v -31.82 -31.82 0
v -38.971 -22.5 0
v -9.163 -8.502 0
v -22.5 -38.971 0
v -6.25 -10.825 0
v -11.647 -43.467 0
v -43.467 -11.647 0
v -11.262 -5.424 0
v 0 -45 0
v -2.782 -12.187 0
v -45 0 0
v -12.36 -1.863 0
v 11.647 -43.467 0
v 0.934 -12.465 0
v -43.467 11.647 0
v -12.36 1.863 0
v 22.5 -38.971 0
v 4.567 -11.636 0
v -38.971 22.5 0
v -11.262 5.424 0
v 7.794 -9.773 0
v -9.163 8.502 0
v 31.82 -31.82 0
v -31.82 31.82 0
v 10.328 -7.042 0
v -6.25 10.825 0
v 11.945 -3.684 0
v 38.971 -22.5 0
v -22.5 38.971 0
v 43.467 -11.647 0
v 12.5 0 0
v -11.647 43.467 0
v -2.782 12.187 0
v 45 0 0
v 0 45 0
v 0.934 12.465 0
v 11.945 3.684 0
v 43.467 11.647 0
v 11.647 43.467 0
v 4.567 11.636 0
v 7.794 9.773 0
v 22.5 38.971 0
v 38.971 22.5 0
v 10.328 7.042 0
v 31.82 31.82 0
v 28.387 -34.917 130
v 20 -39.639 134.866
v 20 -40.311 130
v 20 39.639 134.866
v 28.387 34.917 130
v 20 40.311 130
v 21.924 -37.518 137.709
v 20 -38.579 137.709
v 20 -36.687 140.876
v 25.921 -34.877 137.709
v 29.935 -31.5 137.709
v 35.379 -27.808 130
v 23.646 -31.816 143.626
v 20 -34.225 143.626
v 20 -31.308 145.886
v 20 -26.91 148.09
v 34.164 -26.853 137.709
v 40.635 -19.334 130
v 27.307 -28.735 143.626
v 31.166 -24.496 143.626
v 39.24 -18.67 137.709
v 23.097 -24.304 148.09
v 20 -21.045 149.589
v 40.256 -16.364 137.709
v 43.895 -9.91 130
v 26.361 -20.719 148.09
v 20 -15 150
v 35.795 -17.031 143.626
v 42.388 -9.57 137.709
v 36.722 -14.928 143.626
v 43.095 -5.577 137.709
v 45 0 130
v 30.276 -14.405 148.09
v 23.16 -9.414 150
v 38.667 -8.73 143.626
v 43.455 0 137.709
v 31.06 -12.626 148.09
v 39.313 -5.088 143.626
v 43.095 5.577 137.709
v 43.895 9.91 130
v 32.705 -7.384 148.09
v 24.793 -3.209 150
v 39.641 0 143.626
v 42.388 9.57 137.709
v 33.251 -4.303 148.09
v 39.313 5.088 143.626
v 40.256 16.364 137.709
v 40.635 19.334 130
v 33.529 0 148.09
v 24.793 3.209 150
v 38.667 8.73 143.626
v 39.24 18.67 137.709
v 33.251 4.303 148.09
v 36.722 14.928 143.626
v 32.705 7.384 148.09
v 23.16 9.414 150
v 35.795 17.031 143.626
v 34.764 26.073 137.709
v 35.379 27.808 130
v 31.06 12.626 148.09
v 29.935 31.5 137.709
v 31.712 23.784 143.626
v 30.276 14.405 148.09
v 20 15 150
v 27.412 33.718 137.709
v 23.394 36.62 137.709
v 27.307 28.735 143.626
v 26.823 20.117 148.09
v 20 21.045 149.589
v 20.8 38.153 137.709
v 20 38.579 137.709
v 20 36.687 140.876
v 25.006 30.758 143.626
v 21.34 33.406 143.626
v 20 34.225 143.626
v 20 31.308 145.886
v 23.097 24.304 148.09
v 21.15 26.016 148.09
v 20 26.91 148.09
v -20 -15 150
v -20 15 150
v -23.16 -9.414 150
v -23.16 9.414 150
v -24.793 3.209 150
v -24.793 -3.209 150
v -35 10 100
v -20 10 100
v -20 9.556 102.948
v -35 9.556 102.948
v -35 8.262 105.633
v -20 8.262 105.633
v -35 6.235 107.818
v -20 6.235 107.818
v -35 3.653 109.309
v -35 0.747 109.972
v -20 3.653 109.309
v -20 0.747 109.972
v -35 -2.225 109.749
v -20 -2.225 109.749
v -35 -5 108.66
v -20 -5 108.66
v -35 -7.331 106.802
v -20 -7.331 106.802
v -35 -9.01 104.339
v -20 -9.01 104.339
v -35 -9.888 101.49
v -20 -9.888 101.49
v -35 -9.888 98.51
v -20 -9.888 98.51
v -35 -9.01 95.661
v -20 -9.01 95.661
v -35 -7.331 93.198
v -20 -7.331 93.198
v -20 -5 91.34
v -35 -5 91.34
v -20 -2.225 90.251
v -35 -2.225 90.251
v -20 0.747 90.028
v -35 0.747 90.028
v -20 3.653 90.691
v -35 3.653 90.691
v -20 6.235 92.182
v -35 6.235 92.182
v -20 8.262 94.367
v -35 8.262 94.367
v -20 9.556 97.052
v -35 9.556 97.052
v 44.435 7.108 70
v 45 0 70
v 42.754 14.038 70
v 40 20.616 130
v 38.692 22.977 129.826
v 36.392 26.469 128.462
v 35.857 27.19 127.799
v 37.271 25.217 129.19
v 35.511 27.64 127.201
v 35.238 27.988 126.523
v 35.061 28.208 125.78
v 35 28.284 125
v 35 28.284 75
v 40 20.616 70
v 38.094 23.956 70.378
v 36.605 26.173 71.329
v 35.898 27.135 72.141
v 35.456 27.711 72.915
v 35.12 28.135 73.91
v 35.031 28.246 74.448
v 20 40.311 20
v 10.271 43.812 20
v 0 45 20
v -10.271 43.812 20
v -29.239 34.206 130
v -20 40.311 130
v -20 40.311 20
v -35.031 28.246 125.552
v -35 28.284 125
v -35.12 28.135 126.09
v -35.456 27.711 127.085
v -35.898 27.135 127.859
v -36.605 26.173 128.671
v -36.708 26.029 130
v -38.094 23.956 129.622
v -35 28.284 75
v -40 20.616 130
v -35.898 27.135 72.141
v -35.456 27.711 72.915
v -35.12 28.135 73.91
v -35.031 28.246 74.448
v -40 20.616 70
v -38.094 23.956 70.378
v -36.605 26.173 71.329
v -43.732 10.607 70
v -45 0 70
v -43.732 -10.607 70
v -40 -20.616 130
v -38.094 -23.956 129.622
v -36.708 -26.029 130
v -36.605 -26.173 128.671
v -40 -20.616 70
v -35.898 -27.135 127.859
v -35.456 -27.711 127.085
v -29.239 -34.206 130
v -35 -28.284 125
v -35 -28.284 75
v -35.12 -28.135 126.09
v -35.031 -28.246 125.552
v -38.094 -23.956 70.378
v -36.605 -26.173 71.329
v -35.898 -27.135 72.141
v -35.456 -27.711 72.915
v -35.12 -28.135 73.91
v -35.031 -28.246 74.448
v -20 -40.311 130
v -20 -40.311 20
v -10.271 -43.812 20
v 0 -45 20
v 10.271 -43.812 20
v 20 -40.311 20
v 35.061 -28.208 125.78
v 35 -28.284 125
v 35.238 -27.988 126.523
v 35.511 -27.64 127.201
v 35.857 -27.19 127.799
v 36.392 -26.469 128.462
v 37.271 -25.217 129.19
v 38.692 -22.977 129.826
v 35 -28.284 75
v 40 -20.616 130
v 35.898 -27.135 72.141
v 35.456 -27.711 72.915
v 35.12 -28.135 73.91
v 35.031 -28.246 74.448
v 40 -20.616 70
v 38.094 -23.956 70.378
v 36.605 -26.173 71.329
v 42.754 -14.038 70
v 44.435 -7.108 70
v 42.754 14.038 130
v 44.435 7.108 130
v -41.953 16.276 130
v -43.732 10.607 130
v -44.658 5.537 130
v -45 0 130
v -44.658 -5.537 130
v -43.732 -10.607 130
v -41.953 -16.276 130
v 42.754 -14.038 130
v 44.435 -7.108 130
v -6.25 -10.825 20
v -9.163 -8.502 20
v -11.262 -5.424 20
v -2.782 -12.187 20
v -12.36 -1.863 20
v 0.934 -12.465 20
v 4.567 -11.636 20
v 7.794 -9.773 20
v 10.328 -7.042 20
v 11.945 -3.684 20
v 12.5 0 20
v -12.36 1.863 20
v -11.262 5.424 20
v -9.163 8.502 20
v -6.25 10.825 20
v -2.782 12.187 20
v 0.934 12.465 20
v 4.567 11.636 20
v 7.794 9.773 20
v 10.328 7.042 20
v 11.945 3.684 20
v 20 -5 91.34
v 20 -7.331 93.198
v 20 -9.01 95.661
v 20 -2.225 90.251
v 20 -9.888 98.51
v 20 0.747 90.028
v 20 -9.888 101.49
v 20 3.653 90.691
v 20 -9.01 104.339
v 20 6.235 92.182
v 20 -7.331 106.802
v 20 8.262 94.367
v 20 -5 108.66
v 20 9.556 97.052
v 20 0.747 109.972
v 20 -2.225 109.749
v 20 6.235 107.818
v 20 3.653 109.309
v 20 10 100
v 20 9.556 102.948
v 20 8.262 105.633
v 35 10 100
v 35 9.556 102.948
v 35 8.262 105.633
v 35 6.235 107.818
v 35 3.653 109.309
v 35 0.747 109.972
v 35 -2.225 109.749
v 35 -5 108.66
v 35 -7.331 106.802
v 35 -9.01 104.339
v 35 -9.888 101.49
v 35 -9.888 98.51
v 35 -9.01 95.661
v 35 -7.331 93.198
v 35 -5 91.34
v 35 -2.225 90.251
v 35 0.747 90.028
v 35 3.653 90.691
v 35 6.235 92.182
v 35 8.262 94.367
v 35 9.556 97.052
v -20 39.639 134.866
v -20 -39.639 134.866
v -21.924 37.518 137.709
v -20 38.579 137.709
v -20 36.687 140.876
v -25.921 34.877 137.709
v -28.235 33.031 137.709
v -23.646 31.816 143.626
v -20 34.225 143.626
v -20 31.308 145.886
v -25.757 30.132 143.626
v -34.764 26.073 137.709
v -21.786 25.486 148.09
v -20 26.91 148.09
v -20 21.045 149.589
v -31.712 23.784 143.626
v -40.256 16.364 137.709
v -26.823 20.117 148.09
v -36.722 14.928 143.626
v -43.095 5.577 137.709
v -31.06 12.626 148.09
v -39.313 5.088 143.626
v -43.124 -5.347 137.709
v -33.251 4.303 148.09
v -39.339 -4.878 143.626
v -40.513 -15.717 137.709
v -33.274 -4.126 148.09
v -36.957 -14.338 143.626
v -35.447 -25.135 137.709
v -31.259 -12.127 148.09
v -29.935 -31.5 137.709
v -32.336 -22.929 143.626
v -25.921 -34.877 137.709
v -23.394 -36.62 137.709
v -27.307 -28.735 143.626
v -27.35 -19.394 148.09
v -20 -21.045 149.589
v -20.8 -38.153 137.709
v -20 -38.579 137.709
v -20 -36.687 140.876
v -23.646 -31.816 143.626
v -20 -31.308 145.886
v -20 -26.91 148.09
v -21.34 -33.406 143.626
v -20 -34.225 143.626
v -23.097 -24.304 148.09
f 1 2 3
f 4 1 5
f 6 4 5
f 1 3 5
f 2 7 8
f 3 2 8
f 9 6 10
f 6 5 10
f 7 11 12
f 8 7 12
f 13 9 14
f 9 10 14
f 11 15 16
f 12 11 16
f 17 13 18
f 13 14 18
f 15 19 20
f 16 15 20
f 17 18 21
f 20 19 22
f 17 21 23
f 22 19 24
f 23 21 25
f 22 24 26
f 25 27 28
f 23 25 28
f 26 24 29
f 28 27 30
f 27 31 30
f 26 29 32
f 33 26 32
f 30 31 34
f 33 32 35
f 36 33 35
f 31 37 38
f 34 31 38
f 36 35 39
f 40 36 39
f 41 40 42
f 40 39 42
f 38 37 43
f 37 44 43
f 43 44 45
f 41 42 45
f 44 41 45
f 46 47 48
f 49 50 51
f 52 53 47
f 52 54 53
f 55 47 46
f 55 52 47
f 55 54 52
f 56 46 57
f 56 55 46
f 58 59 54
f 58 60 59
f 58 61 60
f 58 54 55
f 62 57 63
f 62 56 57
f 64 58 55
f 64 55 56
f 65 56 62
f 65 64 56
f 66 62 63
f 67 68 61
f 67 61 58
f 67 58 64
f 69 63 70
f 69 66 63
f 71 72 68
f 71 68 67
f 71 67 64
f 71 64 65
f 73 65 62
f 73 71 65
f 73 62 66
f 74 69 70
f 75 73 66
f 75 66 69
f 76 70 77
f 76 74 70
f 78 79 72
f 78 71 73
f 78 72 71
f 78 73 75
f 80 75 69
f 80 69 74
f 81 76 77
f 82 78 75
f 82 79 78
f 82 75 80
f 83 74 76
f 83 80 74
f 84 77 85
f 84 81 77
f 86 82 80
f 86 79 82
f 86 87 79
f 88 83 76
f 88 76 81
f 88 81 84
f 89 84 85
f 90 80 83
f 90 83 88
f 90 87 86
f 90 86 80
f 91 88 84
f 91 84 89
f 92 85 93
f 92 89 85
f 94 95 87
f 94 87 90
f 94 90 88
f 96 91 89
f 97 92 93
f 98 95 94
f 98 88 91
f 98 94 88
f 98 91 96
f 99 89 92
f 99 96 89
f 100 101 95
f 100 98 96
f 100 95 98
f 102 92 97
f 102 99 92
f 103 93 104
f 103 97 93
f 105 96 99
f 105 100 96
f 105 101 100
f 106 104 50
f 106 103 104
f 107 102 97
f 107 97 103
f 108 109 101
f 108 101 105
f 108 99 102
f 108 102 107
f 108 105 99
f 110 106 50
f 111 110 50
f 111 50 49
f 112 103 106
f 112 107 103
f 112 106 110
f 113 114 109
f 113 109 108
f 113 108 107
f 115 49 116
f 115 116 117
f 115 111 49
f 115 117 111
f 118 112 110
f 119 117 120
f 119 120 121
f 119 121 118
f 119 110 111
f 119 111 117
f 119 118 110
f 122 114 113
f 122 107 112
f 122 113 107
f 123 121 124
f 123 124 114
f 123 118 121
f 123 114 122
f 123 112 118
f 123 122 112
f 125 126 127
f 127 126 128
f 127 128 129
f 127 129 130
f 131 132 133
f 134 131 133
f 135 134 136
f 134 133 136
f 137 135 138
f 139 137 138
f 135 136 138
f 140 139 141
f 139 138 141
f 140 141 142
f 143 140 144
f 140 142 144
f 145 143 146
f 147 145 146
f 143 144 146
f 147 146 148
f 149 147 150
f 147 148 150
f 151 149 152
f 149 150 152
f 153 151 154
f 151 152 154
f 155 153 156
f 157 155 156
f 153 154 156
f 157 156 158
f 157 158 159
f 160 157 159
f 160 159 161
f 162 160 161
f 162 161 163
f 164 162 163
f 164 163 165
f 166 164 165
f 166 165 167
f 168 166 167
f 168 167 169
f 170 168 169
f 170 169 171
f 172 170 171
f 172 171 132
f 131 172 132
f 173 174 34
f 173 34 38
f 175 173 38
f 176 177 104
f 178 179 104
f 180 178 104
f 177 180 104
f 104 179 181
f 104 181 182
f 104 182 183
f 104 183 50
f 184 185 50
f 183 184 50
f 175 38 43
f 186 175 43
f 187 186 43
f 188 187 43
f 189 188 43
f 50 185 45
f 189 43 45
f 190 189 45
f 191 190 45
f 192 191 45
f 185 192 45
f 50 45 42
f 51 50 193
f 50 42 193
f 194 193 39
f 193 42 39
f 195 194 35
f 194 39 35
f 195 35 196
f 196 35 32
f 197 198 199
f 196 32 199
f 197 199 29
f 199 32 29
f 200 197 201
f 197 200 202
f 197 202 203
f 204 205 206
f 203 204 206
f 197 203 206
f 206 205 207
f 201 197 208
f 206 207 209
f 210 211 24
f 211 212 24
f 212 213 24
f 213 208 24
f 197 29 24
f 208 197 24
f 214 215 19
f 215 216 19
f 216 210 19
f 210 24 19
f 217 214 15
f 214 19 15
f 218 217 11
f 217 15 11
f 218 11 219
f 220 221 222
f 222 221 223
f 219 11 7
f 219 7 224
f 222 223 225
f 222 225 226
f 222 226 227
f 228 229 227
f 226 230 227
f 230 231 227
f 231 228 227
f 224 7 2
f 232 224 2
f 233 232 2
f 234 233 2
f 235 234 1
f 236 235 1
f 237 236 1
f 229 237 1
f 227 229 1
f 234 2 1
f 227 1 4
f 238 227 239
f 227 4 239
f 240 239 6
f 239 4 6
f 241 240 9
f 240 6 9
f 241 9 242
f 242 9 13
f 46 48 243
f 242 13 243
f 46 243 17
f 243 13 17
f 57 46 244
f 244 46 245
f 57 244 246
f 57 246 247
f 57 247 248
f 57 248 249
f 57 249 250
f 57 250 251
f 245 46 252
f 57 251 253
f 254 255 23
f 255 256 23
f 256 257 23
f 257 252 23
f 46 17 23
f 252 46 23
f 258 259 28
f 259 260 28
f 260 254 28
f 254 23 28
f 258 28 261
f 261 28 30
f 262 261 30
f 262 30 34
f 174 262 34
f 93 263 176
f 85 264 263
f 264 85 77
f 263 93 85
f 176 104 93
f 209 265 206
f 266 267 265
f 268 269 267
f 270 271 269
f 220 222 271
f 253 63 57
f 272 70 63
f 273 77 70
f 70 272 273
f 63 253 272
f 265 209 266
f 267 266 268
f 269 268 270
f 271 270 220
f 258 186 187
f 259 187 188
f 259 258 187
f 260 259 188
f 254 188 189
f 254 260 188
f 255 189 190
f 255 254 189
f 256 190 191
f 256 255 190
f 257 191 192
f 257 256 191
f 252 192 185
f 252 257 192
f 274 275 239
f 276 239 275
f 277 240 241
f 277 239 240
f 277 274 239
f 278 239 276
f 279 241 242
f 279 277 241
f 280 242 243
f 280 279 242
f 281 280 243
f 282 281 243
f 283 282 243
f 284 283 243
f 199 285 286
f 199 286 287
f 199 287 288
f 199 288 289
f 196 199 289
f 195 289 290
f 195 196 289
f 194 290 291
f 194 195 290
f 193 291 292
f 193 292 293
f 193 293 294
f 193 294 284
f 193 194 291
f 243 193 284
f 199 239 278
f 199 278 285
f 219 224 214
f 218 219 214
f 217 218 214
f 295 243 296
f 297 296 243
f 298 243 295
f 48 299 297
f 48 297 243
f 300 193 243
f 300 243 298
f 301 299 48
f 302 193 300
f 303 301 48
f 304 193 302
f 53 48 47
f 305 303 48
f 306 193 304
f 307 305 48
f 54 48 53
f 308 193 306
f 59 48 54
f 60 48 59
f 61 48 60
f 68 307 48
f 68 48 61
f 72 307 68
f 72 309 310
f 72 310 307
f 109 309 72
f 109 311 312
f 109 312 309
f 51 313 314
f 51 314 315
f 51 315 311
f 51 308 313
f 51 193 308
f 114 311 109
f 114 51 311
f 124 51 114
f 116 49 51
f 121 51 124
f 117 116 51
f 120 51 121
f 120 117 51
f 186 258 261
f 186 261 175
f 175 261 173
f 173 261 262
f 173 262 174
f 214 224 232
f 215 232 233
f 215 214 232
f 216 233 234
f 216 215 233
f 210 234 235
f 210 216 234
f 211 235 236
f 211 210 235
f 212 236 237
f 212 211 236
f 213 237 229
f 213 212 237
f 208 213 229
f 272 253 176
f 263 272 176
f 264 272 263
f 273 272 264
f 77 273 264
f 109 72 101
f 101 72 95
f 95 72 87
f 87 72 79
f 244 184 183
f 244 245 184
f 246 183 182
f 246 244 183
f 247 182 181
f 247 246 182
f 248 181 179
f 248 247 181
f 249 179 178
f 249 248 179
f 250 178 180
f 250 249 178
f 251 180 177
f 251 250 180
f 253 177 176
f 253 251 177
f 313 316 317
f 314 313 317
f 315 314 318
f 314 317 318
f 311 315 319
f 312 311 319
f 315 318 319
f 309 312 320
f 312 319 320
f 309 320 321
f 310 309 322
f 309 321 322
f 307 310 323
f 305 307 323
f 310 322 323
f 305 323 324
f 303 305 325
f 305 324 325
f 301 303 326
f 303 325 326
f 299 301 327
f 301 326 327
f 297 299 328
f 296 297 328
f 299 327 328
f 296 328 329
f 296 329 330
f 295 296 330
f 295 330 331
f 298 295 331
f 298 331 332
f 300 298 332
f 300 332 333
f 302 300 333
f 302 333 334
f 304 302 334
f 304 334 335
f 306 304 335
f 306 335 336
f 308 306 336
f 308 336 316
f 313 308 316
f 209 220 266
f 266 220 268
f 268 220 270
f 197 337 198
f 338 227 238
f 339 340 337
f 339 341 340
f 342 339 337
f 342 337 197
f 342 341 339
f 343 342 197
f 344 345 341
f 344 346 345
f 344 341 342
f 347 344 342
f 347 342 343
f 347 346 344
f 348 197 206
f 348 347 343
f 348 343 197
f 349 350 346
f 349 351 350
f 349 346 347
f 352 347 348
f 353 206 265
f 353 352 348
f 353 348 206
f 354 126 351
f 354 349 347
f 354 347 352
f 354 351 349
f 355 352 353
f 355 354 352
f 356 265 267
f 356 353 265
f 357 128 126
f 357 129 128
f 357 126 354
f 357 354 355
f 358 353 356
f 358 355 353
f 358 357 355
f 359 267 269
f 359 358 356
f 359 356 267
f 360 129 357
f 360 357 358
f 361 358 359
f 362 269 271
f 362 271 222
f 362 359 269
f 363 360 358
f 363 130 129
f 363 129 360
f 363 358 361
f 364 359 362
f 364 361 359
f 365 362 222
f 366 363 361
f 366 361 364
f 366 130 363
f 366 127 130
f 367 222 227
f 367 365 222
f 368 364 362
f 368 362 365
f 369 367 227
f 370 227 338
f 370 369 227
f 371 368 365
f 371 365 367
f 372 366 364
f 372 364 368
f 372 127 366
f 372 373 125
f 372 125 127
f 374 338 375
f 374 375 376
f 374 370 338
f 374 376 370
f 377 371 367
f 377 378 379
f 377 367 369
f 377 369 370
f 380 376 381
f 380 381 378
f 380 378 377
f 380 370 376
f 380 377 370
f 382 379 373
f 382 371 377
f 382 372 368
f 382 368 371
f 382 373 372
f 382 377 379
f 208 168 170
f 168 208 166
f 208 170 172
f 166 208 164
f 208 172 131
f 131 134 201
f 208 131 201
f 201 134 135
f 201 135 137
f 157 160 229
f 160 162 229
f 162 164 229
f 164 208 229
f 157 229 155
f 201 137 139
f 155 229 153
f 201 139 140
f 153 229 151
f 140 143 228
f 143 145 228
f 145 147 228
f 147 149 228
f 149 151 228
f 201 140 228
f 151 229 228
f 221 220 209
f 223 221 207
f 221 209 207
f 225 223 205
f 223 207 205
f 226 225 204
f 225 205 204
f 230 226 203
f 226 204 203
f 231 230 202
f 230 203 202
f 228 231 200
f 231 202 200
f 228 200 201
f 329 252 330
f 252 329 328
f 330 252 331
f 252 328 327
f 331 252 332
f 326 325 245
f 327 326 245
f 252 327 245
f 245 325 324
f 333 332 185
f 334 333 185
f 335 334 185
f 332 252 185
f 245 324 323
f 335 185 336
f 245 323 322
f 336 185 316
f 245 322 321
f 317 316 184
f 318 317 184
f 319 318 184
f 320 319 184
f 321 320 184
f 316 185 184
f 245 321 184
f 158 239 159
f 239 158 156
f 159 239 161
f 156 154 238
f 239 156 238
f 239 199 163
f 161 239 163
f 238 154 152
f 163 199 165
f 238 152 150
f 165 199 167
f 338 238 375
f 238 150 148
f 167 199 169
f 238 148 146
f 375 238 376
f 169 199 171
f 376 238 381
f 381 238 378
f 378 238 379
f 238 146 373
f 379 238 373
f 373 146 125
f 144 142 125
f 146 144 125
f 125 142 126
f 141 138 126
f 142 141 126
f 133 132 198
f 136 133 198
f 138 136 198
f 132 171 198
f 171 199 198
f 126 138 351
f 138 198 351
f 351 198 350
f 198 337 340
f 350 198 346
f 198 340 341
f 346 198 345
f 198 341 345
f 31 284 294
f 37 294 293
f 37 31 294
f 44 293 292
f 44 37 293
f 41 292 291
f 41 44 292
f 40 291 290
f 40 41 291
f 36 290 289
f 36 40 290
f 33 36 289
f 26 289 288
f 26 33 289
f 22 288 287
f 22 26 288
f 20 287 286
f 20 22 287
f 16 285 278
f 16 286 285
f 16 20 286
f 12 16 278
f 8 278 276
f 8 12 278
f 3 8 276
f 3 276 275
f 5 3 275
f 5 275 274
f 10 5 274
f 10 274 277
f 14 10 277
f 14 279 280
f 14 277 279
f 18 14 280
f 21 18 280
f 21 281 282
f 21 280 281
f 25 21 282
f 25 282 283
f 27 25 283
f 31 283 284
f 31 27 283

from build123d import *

# Parameters (mm, degrees)
F0_R          = 45
F0_R_2        = 12.5
F1_DEPTH      = 150
F2_W          = 40
F2_H          = 150
F2_W_2        = 22.3551505804
F2_H_2        = 60
F3_DEPTH      = 100
F3_DEPTH_BACK = 100
F4_R          = 19.99999
F5_R          = 5
F6_R          = 10
F7_DEPTH      = 150


# Not quite as in the source:
# - a fillet or chamfer is up to 0.001 mm smaller than in the source, because OpenCascade refuses the exact size


with BuildPart() as f1:
    # F0 (on Top) → F1 (new body)
    with BuildSketch(Plane.XY):
        Circle(F0_R)
        Circle(F0_R_2, mode=Mode.SUBTRACT)
    extrude(amount=F1_DEPTH)

    # F2 (on Front) → F3 (cut, two sides)
    with BuildSketch(Plane.XZ) as f3_sk:
        with Locations((0, 95)):
            Rectangle(F2_W, F2_H)
        with Locations((-46.1775752902, 100)):
            Rectangle(F2_W_2, F2_H_2)
        with Locations((46.1775752902, 100)):
            Rectangle(F2_W_2, F2_H_2)
    extrude(amount=-F3_DEPTH, mode=Mode.SUBTRACT)
    extrude(f3_sk.sketch, amount=F3_DEPTH_BACK, mode=Mode.SUBTRACT)

    # F4 (radius 20 in the source; OpenCascade refuses exactly that, so slightly less here)
    f4_edges = [f1.edges().sort_by_distance(p)[0] for p in [
        (-45, 0, 150),
        (38.242646, -23.717082, 150),
        (38.242646, 23.717082, 150),
    ]]
    fillet(f4_edges, radius=F4_R)

    # F5
    f5_edges = [f1.edges().sort_by_distance(p)[0] for p in [
        (-35, 0, 130),
        (-35, 0, 70),
        (35, 0, 70),
        (35, 0, 130),
    ]]
    fillet(f5_edges, radius=F5_R)

    # F6 (on face) → F7 (cut)
    with BuildSketch(Plane.YZ.offset(35)):
        with Locations((0, 100)):
            Circle(F6_R)
    extrude(amount=-F7_DEPTH, mode=Mode.SUBTRACT)


solid = f1.part
